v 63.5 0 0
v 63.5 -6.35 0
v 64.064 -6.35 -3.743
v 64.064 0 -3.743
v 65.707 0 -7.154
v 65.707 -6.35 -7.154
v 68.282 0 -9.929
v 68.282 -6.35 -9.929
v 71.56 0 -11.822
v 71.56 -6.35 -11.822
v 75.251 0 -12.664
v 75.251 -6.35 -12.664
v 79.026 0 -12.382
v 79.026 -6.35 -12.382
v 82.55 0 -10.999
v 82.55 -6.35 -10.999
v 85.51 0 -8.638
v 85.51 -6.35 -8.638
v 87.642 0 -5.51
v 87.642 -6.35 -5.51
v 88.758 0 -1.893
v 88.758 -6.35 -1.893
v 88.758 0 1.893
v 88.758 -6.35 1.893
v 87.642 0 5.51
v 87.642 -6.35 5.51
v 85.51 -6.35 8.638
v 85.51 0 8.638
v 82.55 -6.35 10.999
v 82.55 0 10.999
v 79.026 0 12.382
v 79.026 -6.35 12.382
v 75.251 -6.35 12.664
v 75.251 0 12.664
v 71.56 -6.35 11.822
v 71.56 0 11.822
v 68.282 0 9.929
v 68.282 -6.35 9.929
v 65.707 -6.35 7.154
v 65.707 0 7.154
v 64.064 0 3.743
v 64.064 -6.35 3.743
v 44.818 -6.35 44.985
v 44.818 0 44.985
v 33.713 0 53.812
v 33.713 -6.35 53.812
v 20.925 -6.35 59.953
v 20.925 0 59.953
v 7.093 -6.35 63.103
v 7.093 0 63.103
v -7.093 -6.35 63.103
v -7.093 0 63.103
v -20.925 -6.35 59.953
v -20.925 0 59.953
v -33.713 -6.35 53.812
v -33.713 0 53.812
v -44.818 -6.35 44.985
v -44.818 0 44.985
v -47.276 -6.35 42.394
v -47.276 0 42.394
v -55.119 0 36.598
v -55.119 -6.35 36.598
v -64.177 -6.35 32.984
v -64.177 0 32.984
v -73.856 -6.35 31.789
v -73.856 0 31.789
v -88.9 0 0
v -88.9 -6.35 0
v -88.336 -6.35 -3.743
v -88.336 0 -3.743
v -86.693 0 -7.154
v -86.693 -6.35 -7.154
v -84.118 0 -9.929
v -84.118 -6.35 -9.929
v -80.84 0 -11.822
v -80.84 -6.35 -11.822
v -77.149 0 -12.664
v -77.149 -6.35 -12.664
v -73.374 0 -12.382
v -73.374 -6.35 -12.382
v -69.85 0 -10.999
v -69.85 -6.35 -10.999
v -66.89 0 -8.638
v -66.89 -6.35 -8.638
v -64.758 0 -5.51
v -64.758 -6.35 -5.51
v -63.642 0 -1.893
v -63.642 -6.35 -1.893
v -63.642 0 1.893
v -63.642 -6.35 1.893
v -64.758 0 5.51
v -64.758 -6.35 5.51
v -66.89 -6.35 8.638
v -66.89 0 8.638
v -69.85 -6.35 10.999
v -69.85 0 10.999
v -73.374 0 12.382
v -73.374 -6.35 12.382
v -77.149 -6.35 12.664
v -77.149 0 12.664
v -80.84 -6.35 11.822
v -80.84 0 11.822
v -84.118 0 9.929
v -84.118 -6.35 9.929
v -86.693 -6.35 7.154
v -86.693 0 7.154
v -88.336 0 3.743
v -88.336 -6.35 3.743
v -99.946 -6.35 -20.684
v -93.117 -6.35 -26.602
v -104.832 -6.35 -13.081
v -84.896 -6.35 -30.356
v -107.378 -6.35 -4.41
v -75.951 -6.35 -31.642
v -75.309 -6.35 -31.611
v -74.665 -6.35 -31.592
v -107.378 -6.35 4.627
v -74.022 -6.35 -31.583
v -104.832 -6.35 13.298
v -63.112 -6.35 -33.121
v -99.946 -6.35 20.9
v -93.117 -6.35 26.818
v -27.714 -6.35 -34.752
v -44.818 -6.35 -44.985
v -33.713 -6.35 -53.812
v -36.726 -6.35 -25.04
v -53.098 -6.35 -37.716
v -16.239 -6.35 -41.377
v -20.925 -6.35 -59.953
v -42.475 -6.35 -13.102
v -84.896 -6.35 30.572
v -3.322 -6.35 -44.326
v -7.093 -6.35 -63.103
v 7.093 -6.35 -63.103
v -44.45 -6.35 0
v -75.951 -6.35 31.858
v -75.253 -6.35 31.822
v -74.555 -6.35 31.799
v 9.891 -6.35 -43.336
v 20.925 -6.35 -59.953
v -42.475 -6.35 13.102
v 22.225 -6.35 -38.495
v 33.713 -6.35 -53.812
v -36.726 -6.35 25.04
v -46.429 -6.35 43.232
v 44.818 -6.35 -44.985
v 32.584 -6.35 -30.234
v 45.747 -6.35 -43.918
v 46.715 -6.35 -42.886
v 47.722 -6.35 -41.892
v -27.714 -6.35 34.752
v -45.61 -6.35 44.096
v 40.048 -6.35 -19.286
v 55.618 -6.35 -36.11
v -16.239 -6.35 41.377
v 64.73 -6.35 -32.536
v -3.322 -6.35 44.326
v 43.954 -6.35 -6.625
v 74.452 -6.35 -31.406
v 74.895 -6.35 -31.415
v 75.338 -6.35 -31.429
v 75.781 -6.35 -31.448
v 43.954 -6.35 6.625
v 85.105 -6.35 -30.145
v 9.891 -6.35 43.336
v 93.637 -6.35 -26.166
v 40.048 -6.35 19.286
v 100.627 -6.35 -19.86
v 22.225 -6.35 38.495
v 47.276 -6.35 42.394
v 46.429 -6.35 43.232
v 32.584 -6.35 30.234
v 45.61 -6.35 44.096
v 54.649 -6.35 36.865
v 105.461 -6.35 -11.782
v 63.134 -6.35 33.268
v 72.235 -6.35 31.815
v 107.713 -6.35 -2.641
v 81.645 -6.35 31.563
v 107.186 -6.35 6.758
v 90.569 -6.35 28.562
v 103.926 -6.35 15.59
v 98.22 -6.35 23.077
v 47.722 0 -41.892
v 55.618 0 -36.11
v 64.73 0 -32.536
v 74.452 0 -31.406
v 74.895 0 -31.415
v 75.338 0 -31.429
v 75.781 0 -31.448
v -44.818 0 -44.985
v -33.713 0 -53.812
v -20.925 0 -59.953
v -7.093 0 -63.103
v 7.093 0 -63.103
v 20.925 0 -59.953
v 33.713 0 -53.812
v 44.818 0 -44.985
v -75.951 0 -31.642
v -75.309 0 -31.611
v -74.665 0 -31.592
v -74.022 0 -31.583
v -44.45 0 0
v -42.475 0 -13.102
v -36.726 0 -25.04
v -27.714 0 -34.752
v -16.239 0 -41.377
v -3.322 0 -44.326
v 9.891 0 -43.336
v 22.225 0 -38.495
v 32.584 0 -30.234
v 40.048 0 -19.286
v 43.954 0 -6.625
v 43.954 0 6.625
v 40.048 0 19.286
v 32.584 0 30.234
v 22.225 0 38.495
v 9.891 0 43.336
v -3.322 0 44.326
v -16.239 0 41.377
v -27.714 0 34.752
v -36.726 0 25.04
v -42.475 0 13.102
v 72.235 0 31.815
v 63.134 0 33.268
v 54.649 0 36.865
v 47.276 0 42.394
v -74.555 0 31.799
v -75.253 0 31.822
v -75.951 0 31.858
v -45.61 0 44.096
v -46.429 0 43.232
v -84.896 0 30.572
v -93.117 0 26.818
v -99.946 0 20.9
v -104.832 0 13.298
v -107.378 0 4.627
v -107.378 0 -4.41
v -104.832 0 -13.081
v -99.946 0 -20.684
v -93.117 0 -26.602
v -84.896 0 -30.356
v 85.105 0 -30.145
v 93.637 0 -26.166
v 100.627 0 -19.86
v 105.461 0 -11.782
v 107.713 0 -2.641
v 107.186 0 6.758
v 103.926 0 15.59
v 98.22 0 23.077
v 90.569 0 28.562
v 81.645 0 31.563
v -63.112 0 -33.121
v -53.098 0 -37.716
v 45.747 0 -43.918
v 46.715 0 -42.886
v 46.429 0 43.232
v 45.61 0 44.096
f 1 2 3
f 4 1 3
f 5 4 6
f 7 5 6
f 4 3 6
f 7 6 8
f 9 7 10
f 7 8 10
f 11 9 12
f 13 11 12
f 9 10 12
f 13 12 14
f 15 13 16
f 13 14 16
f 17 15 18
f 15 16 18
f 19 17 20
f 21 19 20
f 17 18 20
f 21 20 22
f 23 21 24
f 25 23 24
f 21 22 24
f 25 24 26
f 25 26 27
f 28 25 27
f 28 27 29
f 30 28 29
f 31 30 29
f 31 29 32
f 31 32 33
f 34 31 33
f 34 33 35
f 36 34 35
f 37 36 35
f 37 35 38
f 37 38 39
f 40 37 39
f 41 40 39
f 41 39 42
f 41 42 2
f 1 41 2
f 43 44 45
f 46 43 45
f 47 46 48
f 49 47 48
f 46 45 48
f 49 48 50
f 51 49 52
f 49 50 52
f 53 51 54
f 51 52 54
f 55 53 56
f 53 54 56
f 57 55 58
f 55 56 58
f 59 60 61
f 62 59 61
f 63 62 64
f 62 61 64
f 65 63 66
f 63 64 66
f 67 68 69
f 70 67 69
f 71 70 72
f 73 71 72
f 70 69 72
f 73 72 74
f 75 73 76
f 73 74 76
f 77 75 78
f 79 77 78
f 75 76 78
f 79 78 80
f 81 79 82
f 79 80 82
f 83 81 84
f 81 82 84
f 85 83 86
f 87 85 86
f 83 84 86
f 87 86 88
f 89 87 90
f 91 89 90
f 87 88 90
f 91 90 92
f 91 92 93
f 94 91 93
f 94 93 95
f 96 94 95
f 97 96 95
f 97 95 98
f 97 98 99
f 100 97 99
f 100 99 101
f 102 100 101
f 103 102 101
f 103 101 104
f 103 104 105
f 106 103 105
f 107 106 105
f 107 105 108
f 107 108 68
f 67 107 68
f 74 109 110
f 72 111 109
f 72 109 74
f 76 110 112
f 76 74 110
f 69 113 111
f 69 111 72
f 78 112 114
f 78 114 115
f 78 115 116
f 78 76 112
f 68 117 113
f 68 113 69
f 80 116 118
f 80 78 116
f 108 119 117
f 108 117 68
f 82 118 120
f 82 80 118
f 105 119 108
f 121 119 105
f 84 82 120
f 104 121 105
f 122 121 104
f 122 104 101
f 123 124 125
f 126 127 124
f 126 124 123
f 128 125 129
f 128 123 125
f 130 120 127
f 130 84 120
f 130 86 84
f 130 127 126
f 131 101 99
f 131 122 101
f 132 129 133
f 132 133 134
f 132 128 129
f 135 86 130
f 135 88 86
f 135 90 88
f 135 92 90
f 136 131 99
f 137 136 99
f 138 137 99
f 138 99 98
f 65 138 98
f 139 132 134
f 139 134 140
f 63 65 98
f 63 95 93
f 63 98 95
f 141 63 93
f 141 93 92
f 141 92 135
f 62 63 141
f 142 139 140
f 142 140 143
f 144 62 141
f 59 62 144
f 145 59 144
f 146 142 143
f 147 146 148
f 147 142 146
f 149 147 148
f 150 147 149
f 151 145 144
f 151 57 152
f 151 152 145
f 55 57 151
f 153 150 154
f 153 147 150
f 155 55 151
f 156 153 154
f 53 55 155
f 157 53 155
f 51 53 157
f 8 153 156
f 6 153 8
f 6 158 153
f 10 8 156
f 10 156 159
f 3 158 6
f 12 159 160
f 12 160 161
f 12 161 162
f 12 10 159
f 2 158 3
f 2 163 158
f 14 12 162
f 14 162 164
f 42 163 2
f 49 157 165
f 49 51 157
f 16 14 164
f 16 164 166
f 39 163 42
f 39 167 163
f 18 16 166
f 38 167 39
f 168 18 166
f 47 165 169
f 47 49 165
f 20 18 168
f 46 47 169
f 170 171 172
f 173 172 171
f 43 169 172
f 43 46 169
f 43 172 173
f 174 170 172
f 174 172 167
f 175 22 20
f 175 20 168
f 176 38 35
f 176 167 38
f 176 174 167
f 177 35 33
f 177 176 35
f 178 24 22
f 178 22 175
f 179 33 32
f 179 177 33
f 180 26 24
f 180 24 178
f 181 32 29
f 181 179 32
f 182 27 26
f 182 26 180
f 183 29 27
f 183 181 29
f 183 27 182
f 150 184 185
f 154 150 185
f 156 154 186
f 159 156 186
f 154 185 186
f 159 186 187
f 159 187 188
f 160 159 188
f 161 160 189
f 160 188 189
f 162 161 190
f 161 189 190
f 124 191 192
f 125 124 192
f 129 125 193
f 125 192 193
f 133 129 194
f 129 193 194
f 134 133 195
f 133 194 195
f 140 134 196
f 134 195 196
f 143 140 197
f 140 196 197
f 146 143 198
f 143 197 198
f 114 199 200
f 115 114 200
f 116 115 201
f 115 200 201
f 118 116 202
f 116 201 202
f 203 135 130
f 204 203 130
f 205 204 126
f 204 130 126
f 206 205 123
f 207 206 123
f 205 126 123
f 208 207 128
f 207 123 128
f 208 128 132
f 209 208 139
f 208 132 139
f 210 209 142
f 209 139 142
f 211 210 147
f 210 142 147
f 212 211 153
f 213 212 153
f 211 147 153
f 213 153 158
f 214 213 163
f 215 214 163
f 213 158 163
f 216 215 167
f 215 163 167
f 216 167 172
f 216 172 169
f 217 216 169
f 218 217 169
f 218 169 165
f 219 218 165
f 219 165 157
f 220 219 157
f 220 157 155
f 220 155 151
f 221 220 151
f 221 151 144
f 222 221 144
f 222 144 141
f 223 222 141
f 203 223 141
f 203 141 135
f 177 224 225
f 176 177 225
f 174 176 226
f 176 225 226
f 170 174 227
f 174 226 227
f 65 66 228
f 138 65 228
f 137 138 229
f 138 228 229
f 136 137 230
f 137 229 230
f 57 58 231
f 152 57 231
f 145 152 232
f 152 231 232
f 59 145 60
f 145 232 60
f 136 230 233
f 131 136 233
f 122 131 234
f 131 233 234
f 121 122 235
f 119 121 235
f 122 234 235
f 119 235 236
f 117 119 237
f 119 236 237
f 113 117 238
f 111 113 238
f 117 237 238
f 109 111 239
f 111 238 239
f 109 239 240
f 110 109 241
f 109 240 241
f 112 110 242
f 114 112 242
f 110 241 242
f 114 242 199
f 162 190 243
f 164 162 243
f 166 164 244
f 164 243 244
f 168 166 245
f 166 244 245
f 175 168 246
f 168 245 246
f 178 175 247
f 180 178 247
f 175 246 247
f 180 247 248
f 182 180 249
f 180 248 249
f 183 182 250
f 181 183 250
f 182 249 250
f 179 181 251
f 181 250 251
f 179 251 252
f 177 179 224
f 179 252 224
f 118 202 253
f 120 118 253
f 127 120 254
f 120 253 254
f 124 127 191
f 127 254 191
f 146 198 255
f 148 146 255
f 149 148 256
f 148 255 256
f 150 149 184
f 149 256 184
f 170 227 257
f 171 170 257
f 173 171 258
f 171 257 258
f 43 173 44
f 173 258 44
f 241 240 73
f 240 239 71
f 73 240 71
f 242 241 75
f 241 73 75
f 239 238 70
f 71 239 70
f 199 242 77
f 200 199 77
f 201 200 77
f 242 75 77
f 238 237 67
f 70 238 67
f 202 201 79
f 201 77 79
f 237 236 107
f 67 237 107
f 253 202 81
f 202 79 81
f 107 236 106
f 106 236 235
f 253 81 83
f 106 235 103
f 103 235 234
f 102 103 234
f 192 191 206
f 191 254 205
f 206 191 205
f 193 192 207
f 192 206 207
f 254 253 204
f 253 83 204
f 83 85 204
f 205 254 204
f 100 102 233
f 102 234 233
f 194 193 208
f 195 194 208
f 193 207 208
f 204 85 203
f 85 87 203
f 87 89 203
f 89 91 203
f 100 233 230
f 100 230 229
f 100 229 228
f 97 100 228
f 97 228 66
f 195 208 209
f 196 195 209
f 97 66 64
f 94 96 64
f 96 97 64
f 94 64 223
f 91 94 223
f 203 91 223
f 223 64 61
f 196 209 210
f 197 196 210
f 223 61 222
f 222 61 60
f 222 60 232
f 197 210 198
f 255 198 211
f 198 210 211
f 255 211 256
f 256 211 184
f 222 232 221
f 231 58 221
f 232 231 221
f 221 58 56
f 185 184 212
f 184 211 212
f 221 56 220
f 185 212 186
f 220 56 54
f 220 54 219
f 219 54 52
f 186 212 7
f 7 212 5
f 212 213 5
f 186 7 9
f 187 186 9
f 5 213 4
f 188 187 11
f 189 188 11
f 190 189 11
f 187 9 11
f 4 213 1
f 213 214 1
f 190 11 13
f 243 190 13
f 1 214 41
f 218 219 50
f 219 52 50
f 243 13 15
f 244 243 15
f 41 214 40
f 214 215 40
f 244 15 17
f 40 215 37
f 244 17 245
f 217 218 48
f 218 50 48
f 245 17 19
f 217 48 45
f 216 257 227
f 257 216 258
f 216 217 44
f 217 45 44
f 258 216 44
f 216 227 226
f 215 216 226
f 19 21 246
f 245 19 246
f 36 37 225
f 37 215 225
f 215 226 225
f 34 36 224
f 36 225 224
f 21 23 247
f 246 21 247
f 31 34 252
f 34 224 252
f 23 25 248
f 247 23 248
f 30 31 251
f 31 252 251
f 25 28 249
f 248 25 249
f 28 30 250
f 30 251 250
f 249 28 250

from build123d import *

# Parameters (mm, degrees)
F2_DEPTH = 6.35
F3_D     = 25.4
F4_D     = 88.9


# Not quite as in the source:
# - a length typed as a fraction of an inch, garbled in the dataset ("3 / 203.2 mm" for 3/8 in), is restored


with BuildPart() as f2:
    # F1 (on Front) → F2 (new body)
    with BuildSketch(Plane.XZ):
        with BuildLine():
            ThreePointArc((-47.2755417472, 42.3942574403), (-59.5317634989, 34.5003362533), (-73.8557984397, 31.7890660068))
            ThreePointArc((-73.8557984397, 31.7890660068), (-74.9040664455, 31.8092594153), (-75.9513814682, 31.8582984692))
            ThreePointArc((-75.9513814682, 31.8582984692), (-107.7013814682, 0.1082984692), (-75.9513814682, -31.6417015308))
            ThreePointArc((-75.9513814682, -31.6417015308), (-74.9868907208, -31.6001278987), (-74.0216562697, -31.5830041335))
            ThreePointArc((-74.0216562697, -31.5830041335), (-59.7325831056, -34.2859814401), (-47.4971337693, -42.1458464357))
            ThreePointArc((-47.4971337693, -42.1458464357), (-46.1209982776, -43.530970971), (-44.8176302016, -44.9847765041))
            ThreePointArc((-44.8176302016, -44.9847765041), (0, -63.5000010449), (44.8176302016, -44.9847765041))
            ThreePointArc((44.8176302016, -44.9847765041), (46.2263803756, -43.3976521369), (47.7215078569, -41.8916193935))
            ThreePointArc((47.7215078569, -41.8916193935), (60.0584421445, -34.0280617532), (74.4515791566, -31.4064032457))
            ThreePointArc((74.4515791566, -31.4064032457), (75.1167119815, -31.4211899869), (75.7814841371, -31.4476154228))
            ThreePointArc((75.7814841371, -31.4476154228), (107.7999571445, 2.0780448238), (72.2347193484, 31.814661464))
            ThreePointArc((72.2347193484, 31.814661464), (58.7820372427, 34.8087566031), (47.2755417472, 42.3942574403))
            ThreePointArc((47.2755417472, 42.3942574403), (46.0162162459, 43.6606882414), (44.8176431113, 44.9847615526))
            ThreePointArc((44.8176431113, 44.9847615526), (0, 63.4999989551), (-44.8176431113, 44.9847615526))
            ThreePointArc((-44.8176431113, 44.9847615526), (-46.0162162459, 43.6606882414), (-47.2755417472, 42.3942574403))
        make_face()
    extrude(amount=F2_DEPTH)

    # F3 (through all)
    with Locations(Plane(origin=(0, 0, 0), x_dir=(1, 0, 0), z_dir=(0, 1, 0))):
        with Locations((-76.2, 0), (76.2, 0)):
            Hole(F3_D / 2)

    # F4 (through all)
    with Locations(Plane(origin=(0, 0, 0), x_dir=(1, 0, 0), z_dir=(0, 1, 0))):
        with Locations((0, 0)):
            Hole(F4_D / 2)


solid = f2.part
